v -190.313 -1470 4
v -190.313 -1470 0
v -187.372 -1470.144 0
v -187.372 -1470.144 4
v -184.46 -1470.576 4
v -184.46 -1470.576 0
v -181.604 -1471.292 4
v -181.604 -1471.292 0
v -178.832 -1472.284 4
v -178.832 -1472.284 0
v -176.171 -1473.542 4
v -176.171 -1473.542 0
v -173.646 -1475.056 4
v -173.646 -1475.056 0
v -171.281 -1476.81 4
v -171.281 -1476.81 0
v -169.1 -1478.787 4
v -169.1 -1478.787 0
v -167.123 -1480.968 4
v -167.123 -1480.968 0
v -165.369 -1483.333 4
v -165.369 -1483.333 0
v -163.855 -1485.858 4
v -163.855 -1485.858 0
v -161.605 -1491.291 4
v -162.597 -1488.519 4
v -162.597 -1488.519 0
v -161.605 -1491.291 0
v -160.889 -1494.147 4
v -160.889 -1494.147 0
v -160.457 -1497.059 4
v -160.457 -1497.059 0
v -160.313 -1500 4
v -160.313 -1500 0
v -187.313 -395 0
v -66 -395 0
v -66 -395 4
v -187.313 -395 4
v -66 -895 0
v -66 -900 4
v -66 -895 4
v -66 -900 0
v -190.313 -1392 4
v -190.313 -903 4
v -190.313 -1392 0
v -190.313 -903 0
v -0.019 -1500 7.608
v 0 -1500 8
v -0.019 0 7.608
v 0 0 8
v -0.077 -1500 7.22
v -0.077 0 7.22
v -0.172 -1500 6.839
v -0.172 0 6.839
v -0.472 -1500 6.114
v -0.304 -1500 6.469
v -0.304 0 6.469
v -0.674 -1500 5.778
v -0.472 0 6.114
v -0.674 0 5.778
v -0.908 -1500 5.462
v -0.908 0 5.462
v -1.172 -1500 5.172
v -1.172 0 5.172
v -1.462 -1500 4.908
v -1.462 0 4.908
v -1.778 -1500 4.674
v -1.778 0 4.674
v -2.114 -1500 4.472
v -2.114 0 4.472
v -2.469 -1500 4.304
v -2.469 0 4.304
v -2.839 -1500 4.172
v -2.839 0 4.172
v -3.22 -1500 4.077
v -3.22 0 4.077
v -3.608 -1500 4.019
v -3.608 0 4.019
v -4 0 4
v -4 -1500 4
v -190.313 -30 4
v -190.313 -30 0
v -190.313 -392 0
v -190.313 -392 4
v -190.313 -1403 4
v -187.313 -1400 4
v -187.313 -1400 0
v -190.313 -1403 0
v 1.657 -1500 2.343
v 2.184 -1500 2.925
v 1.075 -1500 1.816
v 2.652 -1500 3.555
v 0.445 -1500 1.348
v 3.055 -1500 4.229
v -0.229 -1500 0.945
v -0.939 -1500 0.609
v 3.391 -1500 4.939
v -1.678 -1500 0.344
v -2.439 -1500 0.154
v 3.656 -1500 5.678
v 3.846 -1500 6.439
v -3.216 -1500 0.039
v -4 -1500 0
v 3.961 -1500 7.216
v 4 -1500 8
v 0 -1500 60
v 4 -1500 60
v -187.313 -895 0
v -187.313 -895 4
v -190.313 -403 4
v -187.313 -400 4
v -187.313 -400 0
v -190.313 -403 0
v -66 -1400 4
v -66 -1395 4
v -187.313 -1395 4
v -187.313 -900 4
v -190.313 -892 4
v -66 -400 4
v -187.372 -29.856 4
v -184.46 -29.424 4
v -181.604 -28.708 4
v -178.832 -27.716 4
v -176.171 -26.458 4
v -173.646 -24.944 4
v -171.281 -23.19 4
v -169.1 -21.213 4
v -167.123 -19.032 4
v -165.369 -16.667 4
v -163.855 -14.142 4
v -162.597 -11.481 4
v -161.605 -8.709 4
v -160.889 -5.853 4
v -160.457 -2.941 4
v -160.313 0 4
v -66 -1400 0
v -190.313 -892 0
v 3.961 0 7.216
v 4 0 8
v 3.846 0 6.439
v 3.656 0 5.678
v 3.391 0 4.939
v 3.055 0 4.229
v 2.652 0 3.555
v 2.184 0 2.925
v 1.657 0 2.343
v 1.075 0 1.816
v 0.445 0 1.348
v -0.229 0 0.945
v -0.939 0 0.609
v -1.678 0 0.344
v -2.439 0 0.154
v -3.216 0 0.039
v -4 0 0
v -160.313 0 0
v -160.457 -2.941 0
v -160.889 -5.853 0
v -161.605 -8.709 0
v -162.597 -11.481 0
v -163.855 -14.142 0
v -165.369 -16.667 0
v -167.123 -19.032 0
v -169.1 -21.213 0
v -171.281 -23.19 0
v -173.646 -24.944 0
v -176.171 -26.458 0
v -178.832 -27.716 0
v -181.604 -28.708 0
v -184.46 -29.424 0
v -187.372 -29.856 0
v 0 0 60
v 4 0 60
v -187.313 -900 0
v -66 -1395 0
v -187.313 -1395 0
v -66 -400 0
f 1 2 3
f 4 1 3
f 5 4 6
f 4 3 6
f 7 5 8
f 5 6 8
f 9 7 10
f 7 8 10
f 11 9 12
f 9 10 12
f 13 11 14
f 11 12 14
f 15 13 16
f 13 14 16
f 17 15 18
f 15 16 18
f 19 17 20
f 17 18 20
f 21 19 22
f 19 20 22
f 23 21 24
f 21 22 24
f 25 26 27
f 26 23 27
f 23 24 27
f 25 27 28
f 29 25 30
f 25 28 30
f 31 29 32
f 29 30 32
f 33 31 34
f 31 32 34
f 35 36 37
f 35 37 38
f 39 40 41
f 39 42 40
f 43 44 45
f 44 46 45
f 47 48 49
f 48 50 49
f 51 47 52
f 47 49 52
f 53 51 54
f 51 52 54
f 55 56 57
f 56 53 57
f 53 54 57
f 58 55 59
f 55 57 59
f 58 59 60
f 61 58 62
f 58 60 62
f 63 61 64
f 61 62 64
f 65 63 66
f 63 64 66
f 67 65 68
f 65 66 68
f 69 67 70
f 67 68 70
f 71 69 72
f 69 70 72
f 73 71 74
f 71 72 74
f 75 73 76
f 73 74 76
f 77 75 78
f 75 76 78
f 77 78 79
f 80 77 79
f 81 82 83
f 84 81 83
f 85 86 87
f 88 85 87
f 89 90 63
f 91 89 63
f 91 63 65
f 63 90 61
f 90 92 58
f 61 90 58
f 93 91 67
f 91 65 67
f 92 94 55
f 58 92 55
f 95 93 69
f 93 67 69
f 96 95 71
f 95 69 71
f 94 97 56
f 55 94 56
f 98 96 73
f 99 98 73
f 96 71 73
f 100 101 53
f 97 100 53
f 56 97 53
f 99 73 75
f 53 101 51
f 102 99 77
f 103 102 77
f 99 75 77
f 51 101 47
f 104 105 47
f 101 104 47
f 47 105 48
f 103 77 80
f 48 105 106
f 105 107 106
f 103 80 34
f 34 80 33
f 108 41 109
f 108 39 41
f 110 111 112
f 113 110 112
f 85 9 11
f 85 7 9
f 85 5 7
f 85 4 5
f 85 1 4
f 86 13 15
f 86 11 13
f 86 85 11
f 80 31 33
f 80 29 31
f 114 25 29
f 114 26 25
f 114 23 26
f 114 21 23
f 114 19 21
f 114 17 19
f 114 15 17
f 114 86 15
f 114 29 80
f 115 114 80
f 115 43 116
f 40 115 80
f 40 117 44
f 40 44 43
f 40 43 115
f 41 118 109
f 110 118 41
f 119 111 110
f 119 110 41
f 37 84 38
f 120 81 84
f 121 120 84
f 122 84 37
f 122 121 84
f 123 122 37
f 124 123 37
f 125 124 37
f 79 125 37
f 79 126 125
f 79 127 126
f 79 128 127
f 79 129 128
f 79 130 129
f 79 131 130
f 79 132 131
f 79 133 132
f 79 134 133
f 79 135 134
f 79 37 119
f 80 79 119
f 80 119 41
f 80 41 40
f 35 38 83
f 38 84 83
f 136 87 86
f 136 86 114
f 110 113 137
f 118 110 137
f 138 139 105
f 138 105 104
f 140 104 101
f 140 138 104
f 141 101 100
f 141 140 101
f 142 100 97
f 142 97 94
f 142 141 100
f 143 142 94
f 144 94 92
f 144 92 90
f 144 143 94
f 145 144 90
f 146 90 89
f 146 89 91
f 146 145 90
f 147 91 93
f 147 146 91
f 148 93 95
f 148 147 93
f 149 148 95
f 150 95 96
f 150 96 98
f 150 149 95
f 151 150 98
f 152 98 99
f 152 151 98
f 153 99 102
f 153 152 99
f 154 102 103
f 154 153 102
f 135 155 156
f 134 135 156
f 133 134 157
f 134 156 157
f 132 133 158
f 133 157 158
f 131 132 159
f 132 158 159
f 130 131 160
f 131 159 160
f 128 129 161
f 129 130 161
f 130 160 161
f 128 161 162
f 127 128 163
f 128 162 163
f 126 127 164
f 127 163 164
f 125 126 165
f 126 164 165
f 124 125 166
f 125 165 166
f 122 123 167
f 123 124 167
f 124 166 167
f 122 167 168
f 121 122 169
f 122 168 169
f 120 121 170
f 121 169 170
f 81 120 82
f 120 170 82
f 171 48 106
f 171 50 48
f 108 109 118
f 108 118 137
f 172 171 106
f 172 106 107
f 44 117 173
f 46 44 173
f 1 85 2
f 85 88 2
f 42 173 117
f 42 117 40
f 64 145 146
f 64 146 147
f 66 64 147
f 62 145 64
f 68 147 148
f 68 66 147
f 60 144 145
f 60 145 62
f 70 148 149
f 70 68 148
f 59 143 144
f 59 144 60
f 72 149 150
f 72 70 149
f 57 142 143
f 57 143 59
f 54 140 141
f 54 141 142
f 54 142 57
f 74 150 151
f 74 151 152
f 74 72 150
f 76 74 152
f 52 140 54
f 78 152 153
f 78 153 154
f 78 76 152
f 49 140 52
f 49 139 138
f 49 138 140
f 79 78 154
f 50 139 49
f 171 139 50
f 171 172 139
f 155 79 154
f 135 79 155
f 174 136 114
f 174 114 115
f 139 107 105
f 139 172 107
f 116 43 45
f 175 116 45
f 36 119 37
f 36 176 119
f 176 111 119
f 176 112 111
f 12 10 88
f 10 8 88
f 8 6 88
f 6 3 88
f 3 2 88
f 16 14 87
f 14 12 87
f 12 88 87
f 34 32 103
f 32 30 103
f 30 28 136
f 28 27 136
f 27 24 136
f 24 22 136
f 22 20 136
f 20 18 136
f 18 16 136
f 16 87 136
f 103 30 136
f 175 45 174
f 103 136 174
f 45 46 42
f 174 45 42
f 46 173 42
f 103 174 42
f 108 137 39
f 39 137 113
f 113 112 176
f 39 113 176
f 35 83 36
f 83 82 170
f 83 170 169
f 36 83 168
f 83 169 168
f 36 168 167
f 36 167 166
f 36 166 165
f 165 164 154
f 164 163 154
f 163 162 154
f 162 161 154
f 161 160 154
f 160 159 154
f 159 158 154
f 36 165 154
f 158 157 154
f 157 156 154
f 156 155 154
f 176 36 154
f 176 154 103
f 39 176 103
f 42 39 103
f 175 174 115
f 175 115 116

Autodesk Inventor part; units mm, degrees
ref_plane "YZ Plane" through (0, 0, 0) normal (1, 0, 0) x (0, 1, 0)
ref_plane "XZ Plane" through (0, 0, 0) normal (0, 1, 0) x (-1, 0, 0)
ref_plane "XY Plane" through (0, 0, 0) normal (0, 0, 1) x (1, 0, 0)
sketch "Sketch1" plane through (0, 0, 0) normal (0, 0, 1) x (1, 0, 0)
  line L0 (0, 0) -> (-190.3129, 0)
  line L1 (-190.3129, 0) -> (-190.3129, -1500)
  line L2 (-190.3129, -1500) -> (0, -1500)
  line L3 (0, -1500) -> (0, 0)
  line L4 (-190.3129, -1400) -> (-66, -1400)
  line L5 (-66, -1400) -> (-66, -1395)
  line L6 (-66, -1395) -> (-190.3129, -1395)
  line L7 (-190.3129, -1395) -> (-190.3129, -1400)
  line L8 (-190.3129, -900) -> (-66, -900)
  line L9 (-66, -900) -> (-66, -895)
  line L10 (-66, -895) -> (-190.3129, -895)
  line L11 (-190.3129, -895) -> (-190.3129, -900)
  line L12 (-190.3129, -400) -> (-66, -400)
  line L13 (-66, -400) -> (-66, -395)
  line L14 (-66, -395) -> (-190.3129, -395)
  line L15 (-190.3129, -395) -> (-190.3129, -400)
  circle A0 centre (-190.3129, 0) radius 30
  circle A1 centre (-190.3129, -1500) radius 30
  point P0 (-190.3129, -395)
  point P1 (-190.3129, -400)
  point P2 (-190.3129, -1395)
  point P3 (-160.3129, 0)
  point P4 (-190.3129, -30)
  point P5 (-190.3129, -1470)
  point P6 (-160.3129, -1500)
  dimension "d0" = 1500
  dimension "d1" = 190.3129
  dimension "d2" = 5
  dimension "d4" = 100
  dimension "d7" = 500
  dimension "d23" = 66
  dimension "d24" = 60
extrude "Plate1" add sketch "Sketch1" along normal blind 4 contours L3 L2 A1 L1 L4 L5 L6 L8 L9 L10 L12 L13 L14 A0 L0
sketch "Sketch2" plane through (4, 0, 0) normal (-1, 0, 0) x (0, -1, 0)
  line L0 (1500, 0) -> (0, 0)
  line L1 (0, 0) -> (0, 60)
  line L2 (0, 60) -> (1500, 60)
  line L3 (1500, 60) -> (1500, 0)
edge flange "Flange1" height 60 angle 90 thickness 4 bend radius 4 thickness toward (-1, 0, 0) relief tear relief width 4 relief depth 2 edges at (0, -750, 4) wall of the first edge with corners at (4, -1500, 0) (4, 0, 0) (4, 0, 60) (4, -1500, 60)
bend "Bend1"
corner "Corner1"
chamfer "Corner Chamfer1" distance 3 angle 45 6 edges at (-190.3129, -1400, 2) (-190.3129, -1395, 2) (-190.3129, -900, 2) (-190.3129, -895, 2) (-190.3129, -395, 2) (-190.3129, -400, 2)
equation "\"d1\" = стрингер_глубина_1"
equation "\"d2\" = паз_под_стрингер_толщина"
equation "\"d23\" = паз_под_стрингер_глубина - Thickness"
equation "\"d24\" = 2 * радиус_выреза_под_сварку"
equation "\"d12\" = Thickness"
equation "\"d13\" = BendReliefWidth"
equation "\"d14\" = BendReliefDepth"
equation "\"d15\" = MinimumRemnant"
equation "\"d16\" = TransitionRadius"
equation "\"d17\" = ребро_усилителей"
equation "\"d19\" = BendRadius"
equation "\"d20\" = CornerReliefSize"
equation "\"d21\" = GapSize"
equation "\"d22\" = JacobiRadiusSize"
equation "\"BendRadius\" = Thickness"
equation "\"BendReliefWidth\" = Thickness"
equation "\"BendReliefDepth\" = 0.5 * Thickness"
equation "\"CornerReliefSize\" = 4 * Thickness"
equation "\"MinimumRemnant\" = 2 * Thickness"
equation "\"TransitionRadius\" = BendRadius"
equation "\"JacobiRadiusSize\" = BendRadius"
equation "\"GapSize\" = Thickness"
equation "\"стрингер_глубина_1\" = 190.312858"
equation "\"паз_под_стрингер_толщина\" = 5"
equation "\"паз_под_стрингер_глубина\" = 70"
equation "\"Thickness\" = 4"
equation "\"радиус_выреза_под_сварку\" = 30"
equation "\"ребро_усилителей\" = 60"
properties part number "01.3 GBK stringer 1" material "Steel"
